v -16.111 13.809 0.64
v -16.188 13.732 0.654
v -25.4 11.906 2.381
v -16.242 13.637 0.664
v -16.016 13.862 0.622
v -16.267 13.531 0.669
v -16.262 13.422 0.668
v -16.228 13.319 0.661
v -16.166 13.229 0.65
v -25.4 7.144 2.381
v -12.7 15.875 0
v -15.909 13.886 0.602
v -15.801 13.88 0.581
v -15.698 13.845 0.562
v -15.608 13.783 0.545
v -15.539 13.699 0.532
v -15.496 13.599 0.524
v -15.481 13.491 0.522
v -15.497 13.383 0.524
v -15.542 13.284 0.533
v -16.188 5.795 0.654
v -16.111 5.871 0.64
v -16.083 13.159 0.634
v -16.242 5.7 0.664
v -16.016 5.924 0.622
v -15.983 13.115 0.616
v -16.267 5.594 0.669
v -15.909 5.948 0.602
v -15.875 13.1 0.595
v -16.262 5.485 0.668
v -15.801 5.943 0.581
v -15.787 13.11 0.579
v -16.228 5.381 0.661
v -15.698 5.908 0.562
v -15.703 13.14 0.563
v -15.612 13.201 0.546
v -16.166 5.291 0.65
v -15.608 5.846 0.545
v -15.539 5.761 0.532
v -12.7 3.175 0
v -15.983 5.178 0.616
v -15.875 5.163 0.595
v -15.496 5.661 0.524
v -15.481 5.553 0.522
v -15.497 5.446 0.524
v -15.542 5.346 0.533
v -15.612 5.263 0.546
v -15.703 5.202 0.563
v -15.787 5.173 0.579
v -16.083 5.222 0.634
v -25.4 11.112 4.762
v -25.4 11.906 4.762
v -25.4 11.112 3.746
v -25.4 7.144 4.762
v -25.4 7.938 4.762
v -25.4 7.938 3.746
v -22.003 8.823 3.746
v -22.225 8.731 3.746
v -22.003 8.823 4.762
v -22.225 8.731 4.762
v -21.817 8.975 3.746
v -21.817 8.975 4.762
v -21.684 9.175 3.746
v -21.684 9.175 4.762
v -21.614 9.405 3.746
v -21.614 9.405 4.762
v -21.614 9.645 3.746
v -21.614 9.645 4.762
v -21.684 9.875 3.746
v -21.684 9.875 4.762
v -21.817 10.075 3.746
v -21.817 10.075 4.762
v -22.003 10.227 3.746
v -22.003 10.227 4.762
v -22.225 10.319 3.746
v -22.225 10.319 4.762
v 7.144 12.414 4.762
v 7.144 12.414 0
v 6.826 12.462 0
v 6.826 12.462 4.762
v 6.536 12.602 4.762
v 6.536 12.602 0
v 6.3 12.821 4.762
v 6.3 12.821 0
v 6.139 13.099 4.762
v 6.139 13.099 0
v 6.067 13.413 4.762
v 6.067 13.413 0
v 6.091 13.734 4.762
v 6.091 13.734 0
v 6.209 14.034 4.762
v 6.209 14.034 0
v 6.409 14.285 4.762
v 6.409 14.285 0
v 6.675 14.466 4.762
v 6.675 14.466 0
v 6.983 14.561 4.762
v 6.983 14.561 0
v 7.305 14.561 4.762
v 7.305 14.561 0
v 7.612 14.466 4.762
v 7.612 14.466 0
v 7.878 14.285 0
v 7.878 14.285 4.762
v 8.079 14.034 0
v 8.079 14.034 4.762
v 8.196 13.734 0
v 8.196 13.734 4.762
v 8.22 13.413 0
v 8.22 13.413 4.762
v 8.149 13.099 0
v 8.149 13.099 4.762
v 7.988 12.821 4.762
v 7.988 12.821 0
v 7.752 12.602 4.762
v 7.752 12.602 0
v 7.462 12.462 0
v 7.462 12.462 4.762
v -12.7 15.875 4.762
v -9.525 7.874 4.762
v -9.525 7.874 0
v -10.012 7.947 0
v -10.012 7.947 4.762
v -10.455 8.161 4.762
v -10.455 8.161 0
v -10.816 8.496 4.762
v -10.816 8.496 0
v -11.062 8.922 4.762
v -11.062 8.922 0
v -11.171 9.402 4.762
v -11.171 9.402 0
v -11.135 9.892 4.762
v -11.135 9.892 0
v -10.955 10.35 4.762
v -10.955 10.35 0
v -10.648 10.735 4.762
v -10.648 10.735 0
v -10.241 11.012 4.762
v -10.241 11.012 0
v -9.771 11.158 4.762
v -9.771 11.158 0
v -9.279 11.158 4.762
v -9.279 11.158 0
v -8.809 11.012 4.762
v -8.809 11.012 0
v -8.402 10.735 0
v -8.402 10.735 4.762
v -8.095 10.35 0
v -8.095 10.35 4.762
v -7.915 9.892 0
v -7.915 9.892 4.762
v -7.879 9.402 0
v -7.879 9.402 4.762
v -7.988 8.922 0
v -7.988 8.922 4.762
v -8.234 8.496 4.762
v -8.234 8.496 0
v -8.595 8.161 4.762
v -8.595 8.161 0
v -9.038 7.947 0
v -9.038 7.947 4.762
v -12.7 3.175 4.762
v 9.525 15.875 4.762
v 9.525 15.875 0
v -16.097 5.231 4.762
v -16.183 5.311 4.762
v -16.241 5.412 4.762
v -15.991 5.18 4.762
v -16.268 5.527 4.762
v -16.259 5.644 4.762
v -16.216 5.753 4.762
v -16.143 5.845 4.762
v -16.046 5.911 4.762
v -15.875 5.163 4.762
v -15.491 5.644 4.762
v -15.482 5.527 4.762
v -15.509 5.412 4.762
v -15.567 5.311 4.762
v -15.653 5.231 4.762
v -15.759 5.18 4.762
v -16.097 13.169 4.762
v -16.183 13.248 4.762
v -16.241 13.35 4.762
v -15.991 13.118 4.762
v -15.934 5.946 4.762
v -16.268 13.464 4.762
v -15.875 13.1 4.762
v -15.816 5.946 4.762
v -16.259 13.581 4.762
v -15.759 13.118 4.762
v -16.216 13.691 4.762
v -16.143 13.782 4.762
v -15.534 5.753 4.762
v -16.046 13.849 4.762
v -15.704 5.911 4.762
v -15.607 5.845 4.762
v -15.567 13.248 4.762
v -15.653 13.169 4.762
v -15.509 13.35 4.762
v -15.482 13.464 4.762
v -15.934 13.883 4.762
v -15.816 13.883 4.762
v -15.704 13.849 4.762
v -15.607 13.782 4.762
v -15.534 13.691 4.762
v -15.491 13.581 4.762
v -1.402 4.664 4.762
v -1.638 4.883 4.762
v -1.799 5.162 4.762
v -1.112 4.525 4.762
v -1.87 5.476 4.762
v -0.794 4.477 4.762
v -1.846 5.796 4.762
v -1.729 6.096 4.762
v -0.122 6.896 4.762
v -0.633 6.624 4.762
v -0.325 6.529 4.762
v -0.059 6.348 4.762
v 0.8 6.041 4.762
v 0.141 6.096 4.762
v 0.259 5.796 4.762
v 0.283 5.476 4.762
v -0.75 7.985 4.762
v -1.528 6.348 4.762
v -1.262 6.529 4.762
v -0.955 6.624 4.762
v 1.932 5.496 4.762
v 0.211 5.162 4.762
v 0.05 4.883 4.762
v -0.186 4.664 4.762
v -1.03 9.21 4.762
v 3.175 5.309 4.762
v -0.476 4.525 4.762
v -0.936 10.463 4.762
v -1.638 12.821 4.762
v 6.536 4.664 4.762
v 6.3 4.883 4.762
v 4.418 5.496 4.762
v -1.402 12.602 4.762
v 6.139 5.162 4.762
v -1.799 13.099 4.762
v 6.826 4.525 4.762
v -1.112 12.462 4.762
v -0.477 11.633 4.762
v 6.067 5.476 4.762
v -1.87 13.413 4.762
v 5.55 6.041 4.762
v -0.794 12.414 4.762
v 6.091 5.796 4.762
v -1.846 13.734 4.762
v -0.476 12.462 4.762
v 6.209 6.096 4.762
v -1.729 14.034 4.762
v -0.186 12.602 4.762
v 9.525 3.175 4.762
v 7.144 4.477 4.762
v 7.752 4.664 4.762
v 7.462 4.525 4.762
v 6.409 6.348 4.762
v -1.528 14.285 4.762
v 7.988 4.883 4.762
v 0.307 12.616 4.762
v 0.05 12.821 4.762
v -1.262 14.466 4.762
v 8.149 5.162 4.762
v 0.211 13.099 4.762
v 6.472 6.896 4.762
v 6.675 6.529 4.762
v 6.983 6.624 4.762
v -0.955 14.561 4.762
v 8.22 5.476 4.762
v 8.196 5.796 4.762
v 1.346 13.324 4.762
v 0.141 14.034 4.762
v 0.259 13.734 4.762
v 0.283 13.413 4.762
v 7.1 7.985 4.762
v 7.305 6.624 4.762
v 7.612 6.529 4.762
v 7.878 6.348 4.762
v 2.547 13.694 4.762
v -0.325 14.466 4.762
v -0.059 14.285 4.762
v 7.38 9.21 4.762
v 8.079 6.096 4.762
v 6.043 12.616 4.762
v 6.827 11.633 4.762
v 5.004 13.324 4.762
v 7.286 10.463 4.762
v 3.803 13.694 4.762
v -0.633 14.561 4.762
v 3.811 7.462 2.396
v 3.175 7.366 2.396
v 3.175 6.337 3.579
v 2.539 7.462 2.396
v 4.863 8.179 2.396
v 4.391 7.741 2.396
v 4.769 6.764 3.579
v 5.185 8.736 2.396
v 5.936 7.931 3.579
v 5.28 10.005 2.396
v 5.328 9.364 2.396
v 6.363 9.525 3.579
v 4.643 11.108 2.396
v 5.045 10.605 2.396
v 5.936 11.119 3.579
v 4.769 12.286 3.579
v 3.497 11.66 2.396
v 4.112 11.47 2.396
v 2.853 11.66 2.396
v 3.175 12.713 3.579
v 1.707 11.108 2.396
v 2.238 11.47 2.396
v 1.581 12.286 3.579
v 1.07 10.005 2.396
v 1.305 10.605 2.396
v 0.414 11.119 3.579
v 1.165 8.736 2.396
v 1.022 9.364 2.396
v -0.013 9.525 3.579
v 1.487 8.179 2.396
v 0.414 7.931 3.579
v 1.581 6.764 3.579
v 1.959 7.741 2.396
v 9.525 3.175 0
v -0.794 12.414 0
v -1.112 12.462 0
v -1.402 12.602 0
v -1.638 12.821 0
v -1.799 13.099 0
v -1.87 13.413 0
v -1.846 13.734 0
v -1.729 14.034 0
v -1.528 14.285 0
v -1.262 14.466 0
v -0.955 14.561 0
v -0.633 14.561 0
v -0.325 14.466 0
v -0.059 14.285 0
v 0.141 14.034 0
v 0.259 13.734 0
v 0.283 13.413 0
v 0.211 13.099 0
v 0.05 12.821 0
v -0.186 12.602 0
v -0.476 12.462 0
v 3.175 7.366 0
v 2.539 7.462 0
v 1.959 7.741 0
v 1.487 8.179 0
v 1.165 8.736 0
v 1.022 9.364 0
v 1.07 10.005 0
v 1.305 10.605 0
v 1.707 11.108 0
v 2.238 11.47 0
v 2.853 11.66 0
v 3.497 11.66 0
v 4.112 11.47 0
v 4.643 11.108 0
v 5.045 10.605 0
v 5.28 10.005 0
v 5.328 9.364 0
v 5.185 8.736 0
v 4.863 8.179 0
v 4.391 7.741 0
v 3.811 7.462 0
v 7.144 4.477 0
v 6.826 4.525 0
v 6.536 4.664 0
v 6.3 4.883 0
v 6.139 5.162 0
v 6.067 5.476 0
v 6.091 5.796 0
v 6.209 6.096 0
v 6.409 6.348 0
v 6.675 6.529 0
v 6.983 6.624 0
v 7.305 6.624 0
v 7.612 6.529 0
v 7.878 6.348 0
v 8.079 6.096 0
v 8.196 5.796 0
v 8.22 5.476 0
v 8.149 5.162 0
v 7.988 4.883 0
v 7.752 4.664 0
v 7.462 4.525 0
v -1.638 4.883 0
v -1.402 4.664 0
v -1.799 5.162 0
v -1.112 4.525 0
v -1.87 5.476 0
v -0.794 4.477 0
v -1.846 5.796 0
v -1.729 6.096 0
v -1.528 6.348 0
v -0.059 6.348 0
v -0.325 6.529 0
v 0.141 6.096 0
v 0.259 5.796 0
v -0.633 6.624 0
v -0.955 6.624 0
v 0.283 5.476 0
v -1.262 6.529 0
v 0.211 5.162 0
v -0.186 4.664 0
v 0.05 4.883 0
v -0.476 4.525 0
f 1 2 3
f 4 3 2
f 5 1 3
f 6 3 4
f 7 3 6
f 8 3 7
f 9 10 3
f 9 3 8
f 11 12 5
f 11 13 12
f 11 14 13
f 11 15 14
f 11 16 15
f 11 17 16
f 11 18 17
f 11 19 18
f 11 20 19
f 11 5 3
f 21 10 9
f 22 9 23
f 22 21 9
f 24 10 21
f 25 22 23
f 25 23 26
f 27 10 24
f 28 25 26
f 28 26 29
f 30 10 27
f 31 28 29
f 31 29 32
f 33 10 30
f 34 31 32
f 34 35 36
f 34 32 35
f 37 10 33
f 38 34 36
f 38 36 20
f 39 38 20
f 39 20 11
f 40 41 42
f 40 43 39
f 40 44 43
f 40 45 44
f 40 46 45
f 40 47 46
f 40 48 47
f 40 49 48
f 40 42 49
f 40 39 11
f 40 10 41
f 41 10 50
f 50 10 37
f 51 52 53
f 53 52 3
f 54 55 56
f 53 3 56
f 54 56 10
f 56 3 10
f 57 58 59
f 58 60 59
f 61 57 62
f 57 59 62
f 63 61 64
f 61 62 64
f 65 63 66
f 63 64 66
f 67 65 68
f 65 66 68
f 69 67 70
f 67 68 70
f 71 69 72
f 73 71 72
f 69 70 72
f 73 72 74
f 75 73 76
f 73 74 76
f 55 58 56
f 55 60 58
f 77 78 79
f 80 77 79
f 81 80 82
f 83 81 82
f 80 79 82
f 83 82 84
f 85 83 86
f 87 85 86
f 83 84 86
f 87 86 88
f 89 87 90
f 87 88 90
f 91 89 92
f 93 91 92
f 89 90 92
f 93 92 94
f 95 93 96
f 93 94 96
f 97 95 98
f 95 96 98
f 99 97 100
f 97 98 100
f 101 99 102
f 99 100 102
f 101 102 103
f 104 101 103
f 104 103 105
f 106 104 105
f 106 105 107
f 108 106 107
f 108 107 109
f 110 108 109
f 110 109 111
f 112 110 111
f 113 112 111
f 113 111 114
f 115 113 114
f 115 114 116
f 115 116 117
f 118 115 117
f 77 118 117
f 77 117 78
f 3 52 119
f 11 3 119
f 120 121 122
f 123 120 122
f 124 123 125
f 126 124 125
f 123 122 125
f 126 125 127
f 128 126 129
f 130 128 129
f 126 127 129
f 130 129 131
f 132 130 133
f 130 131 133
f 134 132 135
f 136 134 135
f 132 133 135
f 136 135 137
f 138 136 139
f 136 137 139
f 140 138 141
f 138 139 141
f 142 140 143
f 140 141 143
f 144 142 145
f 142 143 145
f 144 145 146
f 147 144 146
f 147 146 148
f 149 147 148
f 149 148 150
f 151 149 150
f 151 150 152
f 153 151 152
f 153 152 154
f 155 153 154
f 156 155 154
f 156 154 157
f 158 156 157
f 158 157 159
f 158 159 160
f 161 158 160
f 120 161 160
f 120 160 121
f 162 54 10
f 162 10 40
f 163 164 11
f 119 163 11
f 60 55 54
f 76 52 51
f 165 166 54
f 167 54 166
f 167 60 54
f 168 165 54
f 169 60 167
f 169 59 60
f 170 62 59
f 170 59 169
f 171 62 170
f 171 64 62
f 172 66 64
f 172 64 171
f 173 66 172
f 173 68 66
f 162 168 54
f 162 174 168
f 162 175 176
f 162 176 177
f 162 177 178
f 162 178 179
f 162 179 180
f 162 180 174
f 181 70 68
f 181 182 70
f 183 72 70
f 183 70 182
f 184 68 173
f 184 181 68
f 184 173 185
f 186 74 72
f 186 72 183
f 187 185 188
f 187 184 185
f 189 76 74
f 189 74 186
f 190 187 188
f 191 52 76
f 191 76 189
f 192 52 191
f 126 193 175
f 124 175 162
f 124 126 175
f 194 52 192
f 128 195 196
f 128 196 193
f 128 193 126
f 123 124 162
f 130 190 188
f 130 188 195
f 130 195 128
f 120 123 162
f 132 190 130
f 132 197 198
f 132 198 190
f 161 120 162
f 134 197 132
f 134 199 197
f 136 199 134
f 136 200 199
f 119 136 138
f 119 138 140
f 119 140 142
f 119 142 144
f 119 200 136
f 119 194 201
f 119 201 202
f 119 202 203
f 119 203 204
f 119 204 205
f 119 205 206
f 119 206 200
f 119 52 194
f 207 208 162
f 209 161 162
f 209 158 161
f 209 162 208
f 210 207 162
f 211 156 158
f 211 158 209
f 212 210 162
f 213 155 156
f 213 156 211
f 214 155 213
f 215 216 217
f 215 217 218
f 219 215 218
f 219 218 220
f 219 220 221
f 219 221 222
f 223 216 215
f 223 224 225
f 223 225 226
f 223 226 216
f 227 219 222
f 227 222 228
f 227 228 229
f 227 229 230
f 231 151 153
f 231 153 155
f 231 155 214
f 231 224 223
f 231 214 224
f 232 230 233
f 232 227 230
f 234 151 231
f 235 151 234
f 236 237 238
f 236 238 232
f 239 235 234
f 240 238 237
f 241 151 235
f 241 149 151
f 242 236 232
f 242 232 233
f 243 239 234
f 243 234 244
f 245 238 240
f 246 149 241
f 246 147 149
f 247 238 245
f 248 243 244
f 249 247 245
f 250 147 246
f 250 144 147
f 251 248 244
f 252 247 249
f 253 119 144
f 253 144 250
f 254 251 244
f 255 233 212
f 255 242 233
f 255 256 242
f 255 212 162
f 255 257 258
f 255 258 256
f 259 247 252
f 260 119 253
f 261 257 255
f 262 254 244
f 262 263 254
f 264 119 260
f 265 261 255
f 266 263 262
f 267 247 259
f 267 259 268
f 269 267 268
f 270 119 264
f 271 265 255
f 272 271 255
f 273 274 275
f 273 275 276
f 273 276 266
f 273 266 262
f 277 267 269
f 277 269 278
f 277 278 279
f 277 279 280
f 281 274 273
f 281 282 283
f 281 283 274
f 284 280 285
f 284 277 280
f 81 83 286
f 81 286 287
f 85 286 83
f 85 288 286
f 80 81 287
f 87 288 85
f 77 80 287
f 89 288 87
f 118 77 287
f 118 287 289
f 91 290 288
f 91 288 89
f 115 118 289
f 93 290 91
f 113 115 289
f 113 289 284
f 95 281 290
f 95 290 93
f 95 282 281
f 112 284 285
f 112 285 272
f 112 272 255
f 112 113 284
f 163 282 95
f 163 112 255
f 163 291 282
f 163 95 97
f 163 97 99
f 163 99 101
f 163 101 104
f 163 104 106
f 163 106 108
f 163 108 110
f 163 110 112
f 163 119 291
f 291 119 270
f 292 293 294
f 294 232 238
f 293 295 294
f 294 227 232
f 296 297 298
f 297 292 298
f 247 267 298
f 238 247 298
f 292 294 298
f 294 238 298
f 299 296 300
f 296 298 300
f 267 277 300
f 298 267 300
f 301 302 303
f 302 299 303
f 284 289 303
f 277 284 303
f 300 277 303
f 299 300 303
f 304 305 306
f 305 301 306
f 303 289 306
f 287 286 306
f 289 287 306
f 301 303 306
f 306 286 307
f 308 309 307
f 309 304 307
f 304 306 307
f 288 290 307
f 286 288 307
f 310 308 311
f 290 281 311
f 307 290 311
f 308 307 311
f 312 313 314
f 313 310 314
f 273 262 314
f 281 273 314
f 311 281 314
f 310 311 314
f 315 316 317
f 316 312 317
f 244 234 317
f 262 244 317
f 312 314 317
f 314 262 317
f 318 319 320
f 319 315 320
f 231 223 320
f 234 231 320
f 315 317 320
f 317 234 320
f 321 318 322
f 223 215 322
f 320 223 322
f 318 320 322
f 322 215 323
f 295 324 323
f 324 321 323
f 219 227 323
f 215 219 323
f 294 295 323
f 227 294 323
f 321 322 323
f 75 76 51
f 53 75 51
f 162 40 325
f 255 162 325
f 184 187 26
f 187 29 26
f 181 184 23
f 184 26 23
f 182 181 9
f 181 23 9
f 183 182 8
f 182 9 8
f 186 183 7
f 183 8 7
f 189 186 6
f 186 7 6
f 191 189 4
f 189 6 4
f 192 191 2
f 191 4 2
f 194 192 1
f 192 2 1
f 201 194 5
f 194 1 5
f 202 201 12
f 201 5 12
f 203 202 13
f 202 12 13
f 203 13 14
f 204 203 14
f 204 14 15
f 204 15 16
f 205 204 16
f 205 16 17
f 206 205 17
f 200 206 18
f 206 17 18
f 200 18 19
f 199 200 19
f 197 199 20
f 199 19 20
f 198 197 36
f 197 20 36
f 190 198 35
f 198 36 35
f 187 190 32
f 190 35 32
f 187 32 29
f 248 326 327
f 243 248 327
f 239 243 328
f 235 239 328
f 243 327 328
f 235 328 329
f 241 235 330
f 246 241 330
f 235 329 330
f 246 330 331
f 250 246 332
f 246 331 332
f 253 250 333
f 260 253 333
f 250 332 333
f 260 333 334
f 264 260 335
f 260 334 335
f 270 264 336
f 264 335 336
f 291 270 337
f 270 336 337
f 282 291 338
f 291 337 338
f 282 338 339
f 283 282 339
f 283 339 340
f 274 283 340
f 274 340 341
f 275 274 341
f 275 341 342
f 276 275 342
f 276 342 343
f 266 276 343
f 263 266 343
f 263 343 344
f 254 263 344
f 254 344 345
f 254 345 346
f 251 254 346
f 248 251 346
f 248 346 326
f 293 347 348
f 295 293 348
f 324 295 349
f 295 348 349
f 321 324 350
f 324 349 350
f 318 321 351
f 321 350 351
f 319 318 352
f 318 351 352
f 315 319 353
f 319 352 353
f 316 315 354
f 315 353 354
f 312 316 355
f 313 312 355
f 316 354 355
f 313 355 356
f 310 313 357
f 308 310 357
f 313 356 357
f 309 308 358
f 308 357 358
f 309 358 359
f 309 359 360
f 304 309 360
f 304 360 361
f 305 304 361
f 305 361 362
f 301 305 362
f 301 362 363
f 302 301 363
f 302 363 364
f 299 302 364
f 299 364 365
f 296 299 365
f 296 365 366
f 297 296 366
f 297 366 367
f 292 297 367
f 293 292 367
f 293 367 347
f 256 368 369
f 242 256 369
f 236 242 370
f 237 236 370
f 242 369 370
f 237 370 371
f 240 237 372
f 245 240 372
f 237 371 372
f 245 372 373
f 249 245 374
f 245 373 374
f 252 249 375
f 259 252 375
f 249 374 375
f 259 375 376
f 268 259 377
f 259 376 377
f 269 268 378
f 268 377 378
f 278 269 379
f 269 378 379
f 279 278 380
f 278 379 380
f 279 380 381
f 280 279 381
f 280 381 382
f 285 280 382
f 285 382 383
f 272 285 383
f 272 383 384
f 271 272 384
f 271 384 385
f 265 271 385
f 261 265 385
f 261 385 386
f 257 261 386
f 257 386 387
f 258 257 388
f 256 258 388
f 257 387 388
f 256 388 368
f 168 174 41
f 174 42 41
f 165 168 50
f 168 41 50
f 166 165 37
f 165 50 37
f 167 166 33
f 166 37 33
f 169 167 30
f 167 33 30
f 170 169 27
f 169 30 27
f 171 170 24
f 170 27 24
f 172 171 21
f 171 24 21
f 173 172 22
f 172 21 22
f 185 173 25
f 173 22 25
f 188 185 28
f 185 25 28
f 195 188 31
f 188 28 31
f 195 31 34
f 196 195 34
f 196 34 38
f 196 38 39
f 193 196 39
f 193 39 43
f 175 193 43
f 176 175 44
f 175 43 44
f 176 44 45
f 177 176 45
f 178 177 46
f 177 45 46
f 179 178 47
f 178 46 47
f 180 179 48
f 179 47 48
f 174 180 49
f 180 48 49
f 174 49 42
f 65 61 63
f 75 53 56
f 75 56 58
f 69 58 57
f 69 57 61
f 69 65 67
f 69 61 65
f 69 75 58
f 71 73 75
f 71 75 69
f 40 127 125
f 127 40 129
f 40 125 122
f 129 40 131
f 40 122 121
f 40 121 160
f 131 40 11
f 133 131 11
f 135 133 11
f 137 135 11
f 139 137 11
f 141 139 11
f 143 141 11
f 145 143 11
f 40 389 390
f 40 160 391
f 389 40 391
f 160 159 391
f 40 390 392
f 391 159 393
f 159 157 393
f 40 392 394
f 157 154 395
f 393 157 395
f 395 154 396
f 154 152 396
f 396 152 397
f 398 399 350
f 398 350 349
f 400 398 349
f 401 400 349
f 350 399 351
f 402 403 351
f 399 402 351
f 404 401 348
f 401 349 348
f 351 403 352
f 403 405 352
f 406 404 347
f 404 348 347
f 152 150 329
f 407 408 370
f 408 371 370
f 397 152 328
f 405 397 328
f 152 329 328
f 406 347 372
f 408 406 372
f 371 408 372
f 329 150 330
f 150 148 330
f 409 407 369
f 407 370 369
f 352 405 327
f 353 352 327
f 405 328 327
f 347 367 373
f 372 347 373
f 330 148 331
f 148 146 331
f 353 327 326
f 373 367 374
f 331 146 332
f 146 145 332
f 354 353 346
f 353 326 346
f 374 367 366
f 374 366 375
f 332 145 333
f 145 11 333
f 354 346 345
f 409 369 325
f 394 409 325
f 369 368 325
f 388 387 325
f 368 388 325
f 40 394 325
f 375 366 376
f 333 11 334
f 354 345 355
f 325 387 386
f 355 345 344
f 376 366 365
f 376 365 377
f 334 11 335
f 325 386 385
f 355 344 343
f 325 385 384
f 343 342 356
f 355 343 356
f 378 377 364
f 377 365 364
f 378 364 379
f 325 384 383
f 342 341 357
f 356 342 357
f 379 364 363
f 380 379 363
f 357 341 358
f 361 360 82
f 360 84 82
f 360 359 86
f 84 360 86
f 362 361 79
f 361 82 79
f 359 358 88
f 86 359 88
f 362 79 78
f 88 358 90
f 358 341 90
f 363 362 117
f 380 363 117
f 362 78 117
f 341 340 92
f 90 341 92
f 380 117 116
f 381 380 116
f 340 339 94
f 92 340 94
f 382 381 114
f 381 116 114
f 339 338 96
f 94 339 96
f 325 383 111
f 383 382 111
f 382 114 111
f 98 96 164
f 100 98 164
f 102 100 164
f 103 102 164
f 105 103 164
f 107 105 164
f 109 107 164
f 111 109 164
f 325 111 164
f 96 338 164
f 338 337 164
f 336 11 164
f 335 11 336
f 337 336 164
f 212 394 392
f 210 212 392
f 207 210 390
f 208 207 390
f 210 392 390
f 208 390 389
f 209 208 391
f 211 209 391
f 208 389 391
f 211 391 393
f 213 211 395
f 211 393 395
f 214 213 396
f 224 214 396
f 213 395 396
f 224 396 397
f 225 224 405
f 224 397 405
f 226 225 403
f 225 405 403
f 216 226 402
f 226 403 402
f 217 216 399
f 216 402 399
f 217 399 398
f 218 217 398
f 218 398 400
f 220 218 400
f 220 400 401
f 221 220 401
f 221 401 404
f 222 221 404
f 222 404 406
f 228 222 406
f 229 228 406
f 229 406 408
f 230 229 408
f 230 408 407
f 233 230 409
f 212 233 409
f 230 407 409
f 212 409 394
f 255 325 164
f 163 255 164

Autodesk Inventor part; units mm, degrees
ref_plane "YZ Plane" through (0, 0, 0) normal (1, 0, 0) x (0, 1, 0)
ref_plane "XZ Plane" through (0, 0, 0) normal (0, 1, 0) x (-1, 0, 0)
ref_plane "XY Plane" through (0, 0, 0) normal (0, 0, 1) x (1, 0, 0)
sketch "Sketch1" plane through (0, 0, 0) normal (0, 0, 1) x (1, 0, 0)
  line L0 (-25.4, 15.875) -> (-25.4, 3.175)
  line L1 (-25.4, 3.175) -> (9.525, 3.175)
  line L2 (9.525, 3.175) -> (9.525, 15.875)
  line L3 (9.525, 15.875) -> (-25.4, 15.875)
  dimension "d0" = 12.7
  dimension "d1" = 34.925
extrude "Extrusion1" add sketch "Sketch1" along normal blind 4.7625
hole "Hole1" at (3.175, 9.525, 4.7625) direction (0, 0, -1) diameter 4.318 end through all countersink diameter 8.4328 countersink angle 82 clearance for "Flat Head Machine Screw (82)" size "#8" standard "Ansi Unified Screw Threads"
hole "Hole2" at (-9.525, 9.525, 4.7625) direction (0, 0, -1) diameter 3.302 end through all thread size "8-32 UNC" class "2B" standard "ANSI Unified Screw Threads"
sketch "Sketch2" plane through (0, 0, 4.7625) normal (0, 0, 1) x (1, 0, 0)
  line L0 (-25.4, 15.875) -> (9.525, 15.875) projected
  line L1 (-25.4, 3.175) -> (-25.4, 15.875) projected
  line L2 (-25.4, 11.1125) -> (-22.225, 11.1125)
  line L3 (-22.225, 11.1125) -> (-22.225, 7.9375)
  line L4 (-22.225, 7.9375) -> (-25.4, 7.9375)
  line L5 (-25.4, 7.9375) -> (-25.4, 11.1125)
  arc A0 (-22.225, 7.9375) -> (-22.225, 11.1125) centre (-22.225, 9.525) ccw
  dimension "d22" = 3.175
  dimension "d23" = 6.35
  dimension "d24" = 3.175
extrude "Extrusion2" cut sketch "Sketch2" against normal blind 1.016 contours L1 L2 L3 L4
sketch "Sketch6" plane through (-25.4, 3.175, 0) normal (0, -1, 0) x (1, 0, 0)
  line L0 (0, 0) -> (0, 4.7625) projected
  line L1 (0, 0) -> (34.925, 0) projected
  line L2 (0, 2.3813) -> (12.7, 0)
  line L3 (0, 0) -> (12.7, 0)
  line L4 (0, 0) -> (0, 2.3813)
  line L5 (0, 0) -> (12.7, 0)
  dimension "d35" = 2.3813
  dimension "d132" = 12.7
extrude "Extrusion5" cut sketch "Sketch6" against normal through all
hole "Hole4" at (-15.875, 13.4938, 4.7625) direction (0, 0, -1) diameter 0.7874 end through all
hole "Hole6" at (-15.875, 5.5563, 4.7625) direction (0, 0, -1) diameter 0.7874 end through all
sketch "Sketch8" plane through (0, 0, 4.7625) normal (0, 0, 1) x (1, 0, 0)
  line L0 (-25.4, 11.1125) -> (-22.225, 11.1125) projected
  line L1 (-22.225, 11.1125) -> (-22.225, 7.9375) projected
  line L2 (-25.4, 11.1125) -> (-22.225, 11.1125)
  line L3 (-22.225, 10.3187) -> (-25.4, 11.1125)
  line L4 (-22.225, 11.1125) -> (-22.225, 10.3187)
  line L5 (-22.225, 8.7312) -> (-25.4, 7.9375)
  line L6 (-22.225, 7.9375) -> (-22.225, 8.7312)
  dimension "d80" = 0.7937
  dimension "d81" = 0.7937
extrude "Extrusion7" add sketch "Sketch8" against normal up to next
sketch "Sketch10" plane through (0, 0, 4.7625) normal (0, 0, 1) x (1, 0, 0)
  line L0 (-22.225, 10.3187) -> (-22.225, 7.9375) projected
  line L1 (-22.225, 7.9375) -> (-25.4, 7.9375) projected
  line L2 (-22.225, 8.7312) -> (-25.4, 7.9375)
  line L3 (-22.225, 7.9375) -> (-22.225, 8.7312)
  dimension "d85" = 0.7937
extrude "Extrusion8" add sketch "Sketch10" against normal up to next
sketch "Sketch12" plane through (0, 0, 4.7625) normal (0, 0, 1) x (1, 0, 0)
  line L0 (-25.4, 15.875) -> (9.525, 15.875) projected
  line L1 (-25.4, 11.1125) -> (-25.4, 15.875) projected
  line L2 (-22.225, 10.3187) -> (-22.225, 8.7312) projected
  line L3 (-25.4, 11.9062) -> (-12.7, 15.875)
  line L4 (-25.4, 15.875) -> (-25.4, 11.9062)
  dimension "d88" = 12.7
  dimension "d89" = 3.9688
extrude "Extrusion9" cut sketch "Sketch12" against normal through all
sketch "Sketch13" plane through (0, 0, 4.7625) normal (0, 0, 1) x (1, 0, 0)
  line L0 (-25.4, 3.175) -> (-25.4, 7.9375) projected
  line L1 (9.525, 3.175) -> (-25.4, 3.175) projected
  line L2 (-12.7, 15.875) -> (9.525, 15.875) projected
  line L3 (-12.7, 3.175) -> (-25.4, 3.175)
  line L4 (-25.4, 7.1437) -> (-12.7, 3.175)
  dimension "d92" = 12.7
  dimension "d93" = 3.9688
extrude "Extrusion10" cut sketch "Sketch13" against normal through all
hole "Hole7" at (-0.7937, 13.4938, 4.7625) direction (0, 0, -1) diameter 2.159 end through all
hole "Hole8" at (-0.7937, 5.5562, 4.7625) direction (0, 0, -1) diameter 2.159 end through all
hole "Hole9" at (7.1437, 13.4938, 4.7625) direction (0, 0, -1) diameter 2.159 end through all
hole "Hole10" at (7.1437, 5.5562, 4.7625) direction (0, 0, -1) diameter 2.159 end through all
sketch "Sketch14" plane through (0, 0, 4.7625) normal (0, 0, 1) x (1, 0, 0)
  line L0 (-25.4, 11.1125) -> (-22.225, 10.3187) projected
  line L1 (-22.225, 8.7312) -> (-25.4, 7.9375) projected
  arc A0 (-22.225, 8.7312) -> (-22.225, 10.3187) centre (-22.4234, 9.525) ccw
  line L2 (-22.225, 10.3187) -> (-22.225, 8.7312)
  line L3 (-22.225, 8.7312) -> (-22.225, 10.3187) projected
  point P0 (0, 0)
extrude "Extrusion11" cut sketch "Sketch14" against normal up to surface (1.016 mm away)
properties part number "J005774" material "STAINLESS STEEL, 303"
